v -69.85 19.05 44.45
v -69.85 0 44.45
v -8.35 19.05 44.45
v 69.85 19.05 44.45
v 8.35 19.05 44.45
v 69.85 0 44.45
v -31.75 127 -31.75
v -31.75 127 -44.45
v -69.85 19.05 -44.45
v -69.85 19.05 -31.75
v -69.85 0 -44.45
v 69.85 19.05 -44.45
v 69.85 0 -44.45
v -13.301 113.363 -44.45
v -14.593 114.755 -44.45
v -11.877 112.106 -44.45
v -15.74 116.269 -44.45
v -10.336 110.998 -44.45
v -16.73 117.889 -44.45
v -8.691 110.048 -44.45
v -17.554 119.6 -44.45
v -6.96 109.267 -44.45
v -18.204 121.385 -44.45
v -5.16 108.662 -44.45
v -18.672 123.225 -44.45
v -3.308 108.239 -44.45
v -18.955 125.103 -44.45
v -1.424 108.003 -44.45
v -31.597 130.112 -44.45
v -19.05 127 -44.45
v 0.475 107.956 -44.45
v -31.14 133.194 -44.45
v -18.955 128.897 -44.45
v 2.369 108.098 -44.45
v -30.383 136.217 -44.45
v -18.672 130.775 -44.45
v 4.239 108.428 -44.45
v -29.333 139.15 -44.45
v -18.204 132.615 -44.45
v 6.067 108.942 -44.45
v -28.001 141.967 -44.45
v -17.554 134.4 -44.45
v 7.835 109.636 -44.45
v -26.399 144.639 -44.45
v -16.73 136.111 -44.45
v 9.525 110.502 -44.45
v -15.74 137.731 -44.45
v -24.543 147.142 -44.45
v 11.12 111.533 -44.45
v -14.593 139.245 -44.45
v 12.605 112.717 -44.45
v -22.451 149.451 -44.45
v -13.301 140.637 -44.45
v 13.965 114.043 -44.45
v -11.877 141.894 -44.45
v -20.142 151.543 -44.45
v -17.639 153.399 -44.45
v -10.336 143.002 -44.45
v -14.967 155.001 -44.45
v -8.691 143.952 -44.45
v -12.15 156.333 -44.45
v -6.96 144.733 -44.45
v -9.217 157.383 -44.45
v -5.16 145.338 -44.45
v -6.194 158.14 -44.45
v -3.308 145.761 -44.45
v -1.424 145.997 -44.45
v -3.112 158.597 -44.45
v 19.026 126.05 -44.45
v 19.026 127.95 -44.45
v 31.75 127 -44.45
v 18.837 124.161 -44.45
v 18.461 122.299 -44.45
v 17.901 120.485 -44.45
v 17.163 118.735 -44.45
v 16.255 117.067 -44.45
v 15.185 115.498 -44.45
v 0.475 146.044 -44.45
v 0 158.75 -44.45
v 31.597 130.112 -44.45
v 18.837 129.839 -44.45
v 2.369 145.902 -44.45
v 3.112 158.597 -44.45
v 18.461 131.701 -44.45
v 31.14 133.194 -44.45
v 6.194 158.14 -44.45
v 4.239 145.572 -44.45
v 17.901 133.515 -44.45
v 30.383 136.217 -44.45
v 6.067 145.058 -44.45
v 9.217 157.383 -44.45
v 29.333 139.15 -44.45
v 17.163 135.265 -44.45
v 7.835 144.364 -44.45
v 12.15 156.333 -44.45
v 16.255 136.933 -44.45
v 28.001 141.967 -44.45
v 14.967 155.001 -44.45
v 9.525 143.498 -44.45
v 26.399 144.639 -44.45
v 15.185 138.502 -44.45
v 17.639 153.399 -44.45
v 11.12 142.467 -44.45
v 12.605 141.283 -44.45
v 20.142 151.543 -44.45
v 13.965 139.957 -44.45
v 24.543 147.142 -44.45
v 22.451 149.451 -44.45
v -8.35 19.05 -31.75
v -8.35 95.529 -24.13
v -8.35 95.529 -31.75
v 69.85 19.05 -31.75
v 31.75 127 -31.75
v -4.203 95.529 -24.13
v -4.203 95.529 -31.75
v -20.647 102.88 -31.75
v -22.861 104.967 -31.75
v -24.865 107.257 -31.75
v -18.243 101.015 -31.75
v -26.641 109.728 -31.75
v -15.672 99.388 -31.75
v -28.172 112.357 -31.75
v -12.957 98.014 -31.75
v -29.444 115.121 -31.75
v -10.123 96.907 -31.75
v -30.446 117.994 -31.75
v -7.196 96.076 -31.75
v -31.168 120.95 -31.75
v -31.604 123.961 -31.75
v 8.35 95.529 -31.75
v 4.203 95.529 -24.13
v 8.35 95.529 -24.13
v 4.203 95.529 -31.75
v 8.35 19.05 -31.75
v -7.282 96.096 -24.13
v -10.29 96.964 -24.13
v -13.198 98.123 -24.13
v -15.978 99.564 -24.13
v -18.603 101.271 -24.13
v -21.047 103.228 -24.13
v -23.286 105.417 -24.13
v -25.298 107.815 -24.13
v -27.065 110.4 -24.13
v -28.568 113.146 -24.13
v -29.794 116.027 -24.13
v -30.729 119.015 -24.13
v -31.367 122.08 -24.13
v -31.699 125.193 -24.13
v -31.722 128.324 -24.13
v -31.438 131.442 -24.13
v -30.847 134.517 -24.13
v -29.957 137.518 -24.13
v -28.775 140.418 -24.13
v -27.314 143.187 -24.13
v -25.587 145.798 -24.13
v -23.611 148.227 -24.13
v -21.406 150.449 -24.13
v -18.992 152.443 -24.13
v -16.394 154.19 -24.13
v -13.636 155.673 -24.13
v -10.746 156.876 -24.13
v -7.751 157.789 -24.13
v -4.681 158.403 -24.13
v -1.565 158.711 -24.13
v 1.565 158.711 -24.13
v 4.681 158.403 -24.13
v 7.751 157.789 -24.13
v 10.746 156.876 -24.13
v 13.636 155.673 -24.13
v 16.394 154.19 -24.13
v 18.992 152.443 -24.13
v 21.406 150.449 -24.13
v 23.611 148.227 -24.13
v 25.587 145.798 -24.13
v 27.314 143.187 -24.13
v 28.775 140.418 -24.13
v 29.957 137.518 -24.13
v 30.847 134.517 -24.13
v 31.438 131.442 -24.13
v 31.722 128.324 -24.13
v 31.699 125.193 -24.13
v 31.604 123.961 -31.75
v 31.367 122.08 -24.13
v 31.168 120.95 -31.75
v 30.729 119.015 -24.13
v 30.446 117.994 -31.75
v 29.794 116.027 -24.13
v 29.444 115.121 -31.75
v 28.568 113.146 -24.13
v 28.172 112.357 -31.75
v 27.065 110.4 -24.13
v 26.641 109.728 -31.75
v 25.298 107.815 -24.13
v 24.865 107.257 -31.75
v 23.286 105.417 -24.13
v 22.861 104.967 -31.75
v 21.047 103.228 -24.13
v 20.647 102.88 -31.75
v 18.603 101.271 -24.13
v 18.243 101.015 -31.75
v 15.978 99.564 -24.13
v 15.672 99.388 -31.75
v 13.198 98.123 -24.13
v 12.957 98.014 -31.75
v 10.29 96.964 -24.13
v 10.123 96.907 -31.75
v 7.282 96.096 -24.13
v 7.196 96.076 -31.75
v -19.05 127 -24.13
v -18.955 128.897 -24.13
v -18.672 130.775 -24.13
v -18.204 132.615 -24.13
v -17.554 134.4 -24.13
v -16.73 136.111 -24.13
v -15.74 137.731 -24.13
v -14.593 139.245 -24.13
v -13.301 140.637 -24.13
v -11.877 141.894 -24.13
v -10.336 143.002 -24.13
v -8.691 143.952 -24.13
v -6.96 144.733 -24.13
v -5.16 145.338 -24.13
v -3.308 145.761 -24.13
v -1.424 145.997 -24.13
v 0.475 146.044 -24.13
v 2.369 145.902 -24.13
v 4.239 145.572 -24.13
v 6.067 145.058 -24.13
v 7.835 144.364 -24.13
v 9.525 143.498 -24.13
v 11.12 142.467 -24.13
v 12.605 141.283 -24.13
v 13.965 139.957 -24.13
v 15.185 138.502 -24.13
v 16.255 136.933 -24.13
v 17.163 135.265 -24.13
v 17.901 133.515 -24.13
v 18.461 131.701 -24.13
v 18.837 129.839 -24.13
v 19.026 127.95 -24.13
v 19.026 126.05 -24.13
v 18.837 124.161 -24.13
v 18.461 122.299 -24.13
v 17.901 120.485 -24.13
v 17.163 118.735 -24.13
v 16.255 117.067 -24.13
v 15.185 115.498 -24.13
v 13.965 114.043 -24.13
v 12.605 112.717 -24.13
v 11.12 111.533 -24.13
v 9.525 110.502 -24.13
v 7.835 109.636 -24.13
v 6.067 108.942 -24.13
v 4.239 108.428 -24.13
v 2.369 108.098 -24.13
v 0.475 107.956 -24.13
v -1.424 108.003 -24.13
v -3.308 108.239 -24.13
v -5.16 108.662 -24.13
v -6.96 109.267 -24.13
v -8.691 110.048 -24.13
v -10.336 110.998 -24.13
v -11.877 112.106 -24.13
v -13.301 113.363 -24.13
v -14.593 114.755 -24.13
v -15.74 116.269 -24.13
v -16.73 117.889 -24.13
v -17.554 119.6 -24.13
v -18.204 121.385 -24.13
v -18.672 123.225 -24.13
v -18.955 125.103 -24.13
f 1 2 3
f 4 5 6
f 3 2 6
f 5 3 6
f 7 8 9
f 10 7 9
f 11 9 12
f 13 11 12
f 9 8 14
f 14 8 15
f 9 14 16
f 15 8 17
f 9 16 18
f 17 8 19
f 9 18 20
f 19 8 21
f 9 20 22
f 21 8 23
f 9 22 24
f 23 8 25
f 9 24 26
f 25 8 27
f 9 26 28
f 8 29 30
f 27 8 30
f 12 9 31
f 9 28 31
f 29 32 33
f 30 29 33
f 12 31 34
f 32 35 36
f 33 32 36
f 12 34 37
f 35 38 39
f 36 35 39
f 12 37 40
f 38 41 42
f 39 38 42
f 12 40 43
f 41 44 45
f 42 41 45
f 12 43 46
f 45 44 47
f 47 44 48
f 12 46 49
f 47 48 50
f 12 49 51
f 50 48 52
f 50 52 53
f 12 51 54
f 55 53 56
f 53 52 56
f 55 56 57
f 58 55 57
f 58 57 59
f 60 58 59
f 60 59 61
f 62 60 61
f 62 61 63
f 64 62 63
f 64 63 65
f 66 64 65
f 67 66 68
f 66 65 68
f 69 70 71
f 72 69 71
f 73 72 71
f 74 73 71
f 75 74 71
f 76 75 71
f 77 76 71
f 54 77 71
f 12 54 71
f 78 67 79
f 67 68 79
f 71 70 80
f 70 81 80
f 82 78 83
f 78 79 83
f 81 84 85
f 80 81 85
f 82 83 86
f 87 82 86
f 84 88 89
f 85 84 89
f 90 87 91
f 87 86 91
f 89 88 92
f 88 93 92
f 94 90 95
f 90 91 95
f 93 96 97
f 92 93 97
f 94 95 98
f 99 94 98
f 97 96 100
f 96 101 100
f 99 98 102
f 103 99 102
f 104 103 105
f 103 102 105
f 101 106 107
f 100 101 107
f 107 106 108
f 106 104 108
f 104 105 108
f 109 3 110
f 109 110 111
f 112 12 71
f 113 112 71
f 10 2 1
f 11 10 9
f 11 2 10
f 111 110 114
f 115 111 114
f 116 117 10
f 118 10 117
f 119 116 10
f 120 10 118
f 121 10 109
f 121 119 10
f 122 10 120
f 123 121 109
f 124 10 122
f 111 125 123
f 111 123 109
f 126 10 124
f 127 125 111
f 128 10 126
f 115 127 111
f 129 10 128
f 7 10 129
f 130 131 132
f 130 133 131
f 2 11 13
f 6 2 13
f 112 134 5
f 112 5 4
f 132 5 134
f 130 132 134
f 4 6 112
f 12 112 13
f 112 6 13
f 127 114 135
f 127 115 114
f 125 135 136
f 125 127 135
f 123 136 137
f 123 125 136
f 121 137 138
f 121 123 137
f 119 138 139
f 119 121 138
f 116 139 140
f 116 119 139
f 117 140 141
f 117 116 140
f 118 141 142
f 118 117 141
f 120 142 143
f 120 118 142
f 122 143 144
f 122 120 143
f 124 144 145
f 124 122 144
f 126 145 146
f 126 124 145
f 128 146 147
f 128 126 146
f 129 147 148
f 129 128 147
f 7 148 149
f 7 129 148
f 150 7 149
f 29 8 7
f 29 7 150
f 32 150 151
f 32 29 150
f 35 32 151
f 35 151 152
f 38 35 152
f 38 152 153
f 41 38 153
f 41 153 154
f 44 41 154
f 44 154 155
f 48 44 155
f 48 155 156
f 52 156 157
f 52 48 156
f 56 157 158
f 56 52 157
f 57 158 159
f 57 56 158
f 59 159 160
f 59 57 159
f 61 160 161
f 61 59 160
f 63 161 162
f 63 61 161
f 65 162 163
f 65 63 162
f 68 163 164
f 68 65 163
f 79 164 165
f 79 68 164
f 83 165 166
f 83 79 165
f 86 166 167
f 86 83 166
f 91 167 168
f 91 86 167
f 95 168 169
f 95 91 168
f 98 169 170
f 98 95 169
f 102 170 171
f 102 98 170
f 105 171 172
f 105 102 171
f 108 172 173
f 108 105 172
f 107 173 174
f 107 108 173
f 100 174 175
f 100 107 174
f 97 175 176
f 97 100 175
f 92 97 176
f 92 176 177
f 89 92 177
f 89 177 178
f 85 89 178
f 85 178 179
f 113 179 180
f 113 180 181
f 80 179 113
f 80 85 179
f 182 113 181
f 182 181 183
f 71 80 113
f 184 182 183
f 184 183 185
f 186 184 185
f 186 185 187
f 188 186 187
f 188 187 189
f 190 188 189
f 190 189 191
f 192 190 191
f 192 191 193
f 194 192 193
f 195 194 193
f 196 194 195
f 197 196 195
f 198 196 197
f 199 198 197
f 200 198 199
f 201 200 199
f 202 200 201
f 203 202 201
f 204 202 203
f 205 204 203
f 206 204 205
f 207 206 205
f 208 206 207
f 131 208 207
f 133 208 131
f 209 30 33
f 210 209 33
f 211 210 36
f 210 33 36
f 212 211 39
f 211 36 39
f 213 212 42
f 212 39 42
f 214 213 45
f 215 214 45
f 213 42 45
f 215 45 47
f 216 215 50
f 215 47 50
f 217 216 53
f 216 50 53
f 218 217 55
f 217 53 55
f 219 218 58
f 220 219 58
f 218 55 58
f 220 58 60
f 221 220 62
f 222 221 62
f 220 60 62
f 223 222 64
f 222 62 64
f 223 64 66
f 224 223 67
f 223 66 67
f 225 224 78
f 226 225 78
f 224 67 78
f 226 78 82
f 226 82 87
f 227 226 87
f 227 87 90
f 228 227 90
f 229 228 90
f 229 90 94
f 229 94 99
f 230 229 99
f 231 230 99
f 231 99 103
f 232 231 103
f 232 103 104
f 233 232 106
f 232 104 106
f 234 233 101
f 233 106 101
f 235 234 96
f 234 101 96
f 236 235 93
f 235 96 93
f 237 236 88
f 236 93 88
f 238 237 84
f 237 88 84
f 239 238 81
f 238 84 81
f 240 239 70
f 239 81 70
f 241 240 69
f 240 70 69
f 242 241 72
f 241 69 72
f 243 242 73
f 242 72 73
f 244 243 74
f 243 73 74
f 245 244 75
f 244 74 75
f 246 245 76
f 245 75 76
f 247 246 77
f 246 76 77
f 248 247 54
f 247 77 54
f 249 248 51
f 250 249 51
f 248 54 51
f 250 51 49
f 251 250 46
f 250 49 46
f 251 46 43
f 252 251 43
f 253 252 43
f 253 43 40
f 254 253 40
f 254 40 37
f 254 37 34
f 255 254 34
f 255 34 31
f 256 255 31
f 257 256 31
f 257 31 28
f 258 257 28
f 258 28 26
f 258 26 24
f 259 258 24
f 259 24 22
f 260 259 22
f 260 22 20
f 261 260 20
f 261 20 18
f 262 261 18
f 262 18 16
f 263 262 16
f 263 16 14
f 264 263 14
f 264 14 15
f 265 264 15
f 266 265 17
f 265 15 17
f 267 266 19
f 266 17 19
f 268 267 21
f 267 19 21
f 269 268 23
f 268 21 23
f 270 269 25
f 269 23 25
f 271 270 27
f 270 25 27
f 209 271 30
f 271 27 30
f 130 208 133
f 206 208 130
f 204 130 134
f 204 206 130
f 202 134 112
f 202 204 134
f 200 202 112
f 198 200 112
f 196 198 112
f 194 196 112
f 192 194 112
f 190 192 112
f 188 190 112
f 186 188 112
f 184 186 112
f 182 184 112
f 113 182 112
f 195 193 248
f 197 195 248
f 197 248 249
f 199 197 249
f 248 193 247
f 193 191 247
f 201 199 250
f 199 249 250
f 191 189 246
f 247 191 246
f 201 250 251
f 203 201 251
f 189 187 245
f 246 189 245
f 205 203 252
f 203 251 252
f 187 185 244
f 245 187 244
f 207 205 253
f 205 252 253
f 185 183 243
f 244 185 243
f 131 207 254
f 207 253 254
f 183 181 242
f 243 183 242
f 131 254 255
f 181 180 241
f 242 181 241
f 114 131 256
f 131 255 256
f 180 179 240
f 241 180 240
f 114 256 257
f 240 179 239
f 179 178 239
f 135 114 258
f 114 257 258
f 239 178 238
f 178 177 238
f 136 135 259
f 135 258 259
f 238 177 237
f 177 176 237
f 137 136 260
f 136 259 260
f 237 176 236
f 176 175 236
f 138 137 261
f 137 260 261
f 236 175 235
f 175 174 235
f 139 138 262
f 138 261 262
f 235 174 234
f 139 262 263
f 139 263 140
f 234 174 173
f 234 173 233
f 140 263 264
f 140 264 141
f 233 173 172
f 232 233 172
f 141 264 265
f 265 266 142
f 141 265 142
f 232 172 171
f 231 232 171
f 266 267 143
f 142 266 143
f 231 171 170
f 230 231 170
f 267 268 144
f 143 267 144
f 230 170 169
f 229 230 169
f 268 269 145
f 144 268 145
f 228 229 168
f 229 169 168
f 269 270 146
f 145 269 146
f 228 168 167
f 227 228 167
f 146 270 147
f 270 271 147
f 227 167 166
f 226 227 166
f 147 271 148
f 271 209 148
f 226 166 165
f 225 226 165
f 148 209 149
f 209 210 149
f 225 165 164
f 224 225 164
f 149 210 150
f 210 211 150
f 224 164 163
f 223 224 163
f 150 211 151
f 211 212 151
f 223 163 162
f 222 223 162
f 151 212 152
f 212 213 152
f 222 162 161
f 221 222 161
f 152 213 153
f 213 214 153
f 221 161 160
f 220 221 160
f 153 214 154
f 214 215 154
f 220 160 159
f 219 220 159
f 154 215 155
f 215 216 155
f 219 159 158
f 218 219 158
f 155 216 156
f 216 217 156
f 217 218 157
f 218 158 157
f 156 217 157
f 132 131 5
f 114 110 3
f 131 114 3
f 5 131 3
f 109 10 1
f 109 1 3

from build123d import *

# Parameters (mm, degrees)
SKETCH1_W           = 139.7
SKETCH1_H           = 88.9
BOSS_EXTRUDE1_DEPTH = 19.05
SKETCH2_R           = 31.75
SKETCH2_R_2         = 19.05
BOSS_EXTRUDE2_DEPTH = 20.32
BOSS_EXTRUDE3_DEPTH = 12.7
SKETCH5_W           = 16.69963643
SKETCH5_H           = 76.2
BOSS_EXTRUDE4_DEPTH = 76.4794
CUT_EXTRUDE1_DEPTH  = 17.018


with BuildPart() as part:
    # Sketch1 → Boss-Extrude1 (new body)
    with BuildSketch(Plane(origin=(0, 0, 0), x_dir=(1, 0, 0), z_dir=(0, 1, 0))):
        Rectangle(SKETCH1_W, SKETCH1_H)
    extrude(amount=BOSS_EXTRUDE1_DEPTH)



with BuildPart() as body_2:
    # Sketch2 → Boss-Extrude2 (new body)
    with BuildSketch(Plane(origin=(0, 0, -44.45), x_dir=(-1, 0, 0), z_dir=(0, 0, -1))):
        with Locations((0, 127)):
            Circle(SKETCH2_R)
        with Locations((0, 127)):
            Circle(SKETCH2_R_2, mode=Mode.SUBTRACT)
    extrude(amount=-BOSS_EXTRUDE2_DEPTH)


with BuildPart() as part_1:
    add(part.part)

    add(body_2.part)  # Boss-Extrude3 merges body 2
    # Sketch3 → Boss-Extrude3 (add)
    with BuildSketch(Plane(origin=(0, 0, -44.45), x_dir=(-1, 0, 0), z_dir=(0, 0, -1))):
        with BuildLine():
            ThreePointArc((-31.75, 127), (0, 95.25), (31.75, 127))
            Line((31.75, 127), (69.85, 19.05))
            Line((69.85, 19.05), (-69.85, 19.05))
            Line((-69.85, 19.05), (-31.75, 127))
        make_face()
    extrude(amount=-BOSS_EXTRUDE3_DEPTH)

    # Sketch5 → Boss-Extrude4 (add)
    with BuildSketch(Plane(origin=(0, 19.05, 0), x_dir=(1, 0, 0), z_dir=(0, 1, 0))):
        with Locations((0, -6.35)):
            Rectangle(SKETCH5_W, SKETCH5_H)
    extrude(amount=BOSS_EXTRUDE4_DEPTH)

    # Sketch6 → Cut-Extrude1 (cut)
    with BuildSketch(Plane.ZY.offset(8.349818215)):
        Polygon((-24.13, 95.5294), (44.45, 19.05), (44.45, 95.5294), align=None)
    extrude(amount=-CUT_EXTRUDE1_DEPTH, mode=Mode.SUBTRACT)


solid = part_1.part
